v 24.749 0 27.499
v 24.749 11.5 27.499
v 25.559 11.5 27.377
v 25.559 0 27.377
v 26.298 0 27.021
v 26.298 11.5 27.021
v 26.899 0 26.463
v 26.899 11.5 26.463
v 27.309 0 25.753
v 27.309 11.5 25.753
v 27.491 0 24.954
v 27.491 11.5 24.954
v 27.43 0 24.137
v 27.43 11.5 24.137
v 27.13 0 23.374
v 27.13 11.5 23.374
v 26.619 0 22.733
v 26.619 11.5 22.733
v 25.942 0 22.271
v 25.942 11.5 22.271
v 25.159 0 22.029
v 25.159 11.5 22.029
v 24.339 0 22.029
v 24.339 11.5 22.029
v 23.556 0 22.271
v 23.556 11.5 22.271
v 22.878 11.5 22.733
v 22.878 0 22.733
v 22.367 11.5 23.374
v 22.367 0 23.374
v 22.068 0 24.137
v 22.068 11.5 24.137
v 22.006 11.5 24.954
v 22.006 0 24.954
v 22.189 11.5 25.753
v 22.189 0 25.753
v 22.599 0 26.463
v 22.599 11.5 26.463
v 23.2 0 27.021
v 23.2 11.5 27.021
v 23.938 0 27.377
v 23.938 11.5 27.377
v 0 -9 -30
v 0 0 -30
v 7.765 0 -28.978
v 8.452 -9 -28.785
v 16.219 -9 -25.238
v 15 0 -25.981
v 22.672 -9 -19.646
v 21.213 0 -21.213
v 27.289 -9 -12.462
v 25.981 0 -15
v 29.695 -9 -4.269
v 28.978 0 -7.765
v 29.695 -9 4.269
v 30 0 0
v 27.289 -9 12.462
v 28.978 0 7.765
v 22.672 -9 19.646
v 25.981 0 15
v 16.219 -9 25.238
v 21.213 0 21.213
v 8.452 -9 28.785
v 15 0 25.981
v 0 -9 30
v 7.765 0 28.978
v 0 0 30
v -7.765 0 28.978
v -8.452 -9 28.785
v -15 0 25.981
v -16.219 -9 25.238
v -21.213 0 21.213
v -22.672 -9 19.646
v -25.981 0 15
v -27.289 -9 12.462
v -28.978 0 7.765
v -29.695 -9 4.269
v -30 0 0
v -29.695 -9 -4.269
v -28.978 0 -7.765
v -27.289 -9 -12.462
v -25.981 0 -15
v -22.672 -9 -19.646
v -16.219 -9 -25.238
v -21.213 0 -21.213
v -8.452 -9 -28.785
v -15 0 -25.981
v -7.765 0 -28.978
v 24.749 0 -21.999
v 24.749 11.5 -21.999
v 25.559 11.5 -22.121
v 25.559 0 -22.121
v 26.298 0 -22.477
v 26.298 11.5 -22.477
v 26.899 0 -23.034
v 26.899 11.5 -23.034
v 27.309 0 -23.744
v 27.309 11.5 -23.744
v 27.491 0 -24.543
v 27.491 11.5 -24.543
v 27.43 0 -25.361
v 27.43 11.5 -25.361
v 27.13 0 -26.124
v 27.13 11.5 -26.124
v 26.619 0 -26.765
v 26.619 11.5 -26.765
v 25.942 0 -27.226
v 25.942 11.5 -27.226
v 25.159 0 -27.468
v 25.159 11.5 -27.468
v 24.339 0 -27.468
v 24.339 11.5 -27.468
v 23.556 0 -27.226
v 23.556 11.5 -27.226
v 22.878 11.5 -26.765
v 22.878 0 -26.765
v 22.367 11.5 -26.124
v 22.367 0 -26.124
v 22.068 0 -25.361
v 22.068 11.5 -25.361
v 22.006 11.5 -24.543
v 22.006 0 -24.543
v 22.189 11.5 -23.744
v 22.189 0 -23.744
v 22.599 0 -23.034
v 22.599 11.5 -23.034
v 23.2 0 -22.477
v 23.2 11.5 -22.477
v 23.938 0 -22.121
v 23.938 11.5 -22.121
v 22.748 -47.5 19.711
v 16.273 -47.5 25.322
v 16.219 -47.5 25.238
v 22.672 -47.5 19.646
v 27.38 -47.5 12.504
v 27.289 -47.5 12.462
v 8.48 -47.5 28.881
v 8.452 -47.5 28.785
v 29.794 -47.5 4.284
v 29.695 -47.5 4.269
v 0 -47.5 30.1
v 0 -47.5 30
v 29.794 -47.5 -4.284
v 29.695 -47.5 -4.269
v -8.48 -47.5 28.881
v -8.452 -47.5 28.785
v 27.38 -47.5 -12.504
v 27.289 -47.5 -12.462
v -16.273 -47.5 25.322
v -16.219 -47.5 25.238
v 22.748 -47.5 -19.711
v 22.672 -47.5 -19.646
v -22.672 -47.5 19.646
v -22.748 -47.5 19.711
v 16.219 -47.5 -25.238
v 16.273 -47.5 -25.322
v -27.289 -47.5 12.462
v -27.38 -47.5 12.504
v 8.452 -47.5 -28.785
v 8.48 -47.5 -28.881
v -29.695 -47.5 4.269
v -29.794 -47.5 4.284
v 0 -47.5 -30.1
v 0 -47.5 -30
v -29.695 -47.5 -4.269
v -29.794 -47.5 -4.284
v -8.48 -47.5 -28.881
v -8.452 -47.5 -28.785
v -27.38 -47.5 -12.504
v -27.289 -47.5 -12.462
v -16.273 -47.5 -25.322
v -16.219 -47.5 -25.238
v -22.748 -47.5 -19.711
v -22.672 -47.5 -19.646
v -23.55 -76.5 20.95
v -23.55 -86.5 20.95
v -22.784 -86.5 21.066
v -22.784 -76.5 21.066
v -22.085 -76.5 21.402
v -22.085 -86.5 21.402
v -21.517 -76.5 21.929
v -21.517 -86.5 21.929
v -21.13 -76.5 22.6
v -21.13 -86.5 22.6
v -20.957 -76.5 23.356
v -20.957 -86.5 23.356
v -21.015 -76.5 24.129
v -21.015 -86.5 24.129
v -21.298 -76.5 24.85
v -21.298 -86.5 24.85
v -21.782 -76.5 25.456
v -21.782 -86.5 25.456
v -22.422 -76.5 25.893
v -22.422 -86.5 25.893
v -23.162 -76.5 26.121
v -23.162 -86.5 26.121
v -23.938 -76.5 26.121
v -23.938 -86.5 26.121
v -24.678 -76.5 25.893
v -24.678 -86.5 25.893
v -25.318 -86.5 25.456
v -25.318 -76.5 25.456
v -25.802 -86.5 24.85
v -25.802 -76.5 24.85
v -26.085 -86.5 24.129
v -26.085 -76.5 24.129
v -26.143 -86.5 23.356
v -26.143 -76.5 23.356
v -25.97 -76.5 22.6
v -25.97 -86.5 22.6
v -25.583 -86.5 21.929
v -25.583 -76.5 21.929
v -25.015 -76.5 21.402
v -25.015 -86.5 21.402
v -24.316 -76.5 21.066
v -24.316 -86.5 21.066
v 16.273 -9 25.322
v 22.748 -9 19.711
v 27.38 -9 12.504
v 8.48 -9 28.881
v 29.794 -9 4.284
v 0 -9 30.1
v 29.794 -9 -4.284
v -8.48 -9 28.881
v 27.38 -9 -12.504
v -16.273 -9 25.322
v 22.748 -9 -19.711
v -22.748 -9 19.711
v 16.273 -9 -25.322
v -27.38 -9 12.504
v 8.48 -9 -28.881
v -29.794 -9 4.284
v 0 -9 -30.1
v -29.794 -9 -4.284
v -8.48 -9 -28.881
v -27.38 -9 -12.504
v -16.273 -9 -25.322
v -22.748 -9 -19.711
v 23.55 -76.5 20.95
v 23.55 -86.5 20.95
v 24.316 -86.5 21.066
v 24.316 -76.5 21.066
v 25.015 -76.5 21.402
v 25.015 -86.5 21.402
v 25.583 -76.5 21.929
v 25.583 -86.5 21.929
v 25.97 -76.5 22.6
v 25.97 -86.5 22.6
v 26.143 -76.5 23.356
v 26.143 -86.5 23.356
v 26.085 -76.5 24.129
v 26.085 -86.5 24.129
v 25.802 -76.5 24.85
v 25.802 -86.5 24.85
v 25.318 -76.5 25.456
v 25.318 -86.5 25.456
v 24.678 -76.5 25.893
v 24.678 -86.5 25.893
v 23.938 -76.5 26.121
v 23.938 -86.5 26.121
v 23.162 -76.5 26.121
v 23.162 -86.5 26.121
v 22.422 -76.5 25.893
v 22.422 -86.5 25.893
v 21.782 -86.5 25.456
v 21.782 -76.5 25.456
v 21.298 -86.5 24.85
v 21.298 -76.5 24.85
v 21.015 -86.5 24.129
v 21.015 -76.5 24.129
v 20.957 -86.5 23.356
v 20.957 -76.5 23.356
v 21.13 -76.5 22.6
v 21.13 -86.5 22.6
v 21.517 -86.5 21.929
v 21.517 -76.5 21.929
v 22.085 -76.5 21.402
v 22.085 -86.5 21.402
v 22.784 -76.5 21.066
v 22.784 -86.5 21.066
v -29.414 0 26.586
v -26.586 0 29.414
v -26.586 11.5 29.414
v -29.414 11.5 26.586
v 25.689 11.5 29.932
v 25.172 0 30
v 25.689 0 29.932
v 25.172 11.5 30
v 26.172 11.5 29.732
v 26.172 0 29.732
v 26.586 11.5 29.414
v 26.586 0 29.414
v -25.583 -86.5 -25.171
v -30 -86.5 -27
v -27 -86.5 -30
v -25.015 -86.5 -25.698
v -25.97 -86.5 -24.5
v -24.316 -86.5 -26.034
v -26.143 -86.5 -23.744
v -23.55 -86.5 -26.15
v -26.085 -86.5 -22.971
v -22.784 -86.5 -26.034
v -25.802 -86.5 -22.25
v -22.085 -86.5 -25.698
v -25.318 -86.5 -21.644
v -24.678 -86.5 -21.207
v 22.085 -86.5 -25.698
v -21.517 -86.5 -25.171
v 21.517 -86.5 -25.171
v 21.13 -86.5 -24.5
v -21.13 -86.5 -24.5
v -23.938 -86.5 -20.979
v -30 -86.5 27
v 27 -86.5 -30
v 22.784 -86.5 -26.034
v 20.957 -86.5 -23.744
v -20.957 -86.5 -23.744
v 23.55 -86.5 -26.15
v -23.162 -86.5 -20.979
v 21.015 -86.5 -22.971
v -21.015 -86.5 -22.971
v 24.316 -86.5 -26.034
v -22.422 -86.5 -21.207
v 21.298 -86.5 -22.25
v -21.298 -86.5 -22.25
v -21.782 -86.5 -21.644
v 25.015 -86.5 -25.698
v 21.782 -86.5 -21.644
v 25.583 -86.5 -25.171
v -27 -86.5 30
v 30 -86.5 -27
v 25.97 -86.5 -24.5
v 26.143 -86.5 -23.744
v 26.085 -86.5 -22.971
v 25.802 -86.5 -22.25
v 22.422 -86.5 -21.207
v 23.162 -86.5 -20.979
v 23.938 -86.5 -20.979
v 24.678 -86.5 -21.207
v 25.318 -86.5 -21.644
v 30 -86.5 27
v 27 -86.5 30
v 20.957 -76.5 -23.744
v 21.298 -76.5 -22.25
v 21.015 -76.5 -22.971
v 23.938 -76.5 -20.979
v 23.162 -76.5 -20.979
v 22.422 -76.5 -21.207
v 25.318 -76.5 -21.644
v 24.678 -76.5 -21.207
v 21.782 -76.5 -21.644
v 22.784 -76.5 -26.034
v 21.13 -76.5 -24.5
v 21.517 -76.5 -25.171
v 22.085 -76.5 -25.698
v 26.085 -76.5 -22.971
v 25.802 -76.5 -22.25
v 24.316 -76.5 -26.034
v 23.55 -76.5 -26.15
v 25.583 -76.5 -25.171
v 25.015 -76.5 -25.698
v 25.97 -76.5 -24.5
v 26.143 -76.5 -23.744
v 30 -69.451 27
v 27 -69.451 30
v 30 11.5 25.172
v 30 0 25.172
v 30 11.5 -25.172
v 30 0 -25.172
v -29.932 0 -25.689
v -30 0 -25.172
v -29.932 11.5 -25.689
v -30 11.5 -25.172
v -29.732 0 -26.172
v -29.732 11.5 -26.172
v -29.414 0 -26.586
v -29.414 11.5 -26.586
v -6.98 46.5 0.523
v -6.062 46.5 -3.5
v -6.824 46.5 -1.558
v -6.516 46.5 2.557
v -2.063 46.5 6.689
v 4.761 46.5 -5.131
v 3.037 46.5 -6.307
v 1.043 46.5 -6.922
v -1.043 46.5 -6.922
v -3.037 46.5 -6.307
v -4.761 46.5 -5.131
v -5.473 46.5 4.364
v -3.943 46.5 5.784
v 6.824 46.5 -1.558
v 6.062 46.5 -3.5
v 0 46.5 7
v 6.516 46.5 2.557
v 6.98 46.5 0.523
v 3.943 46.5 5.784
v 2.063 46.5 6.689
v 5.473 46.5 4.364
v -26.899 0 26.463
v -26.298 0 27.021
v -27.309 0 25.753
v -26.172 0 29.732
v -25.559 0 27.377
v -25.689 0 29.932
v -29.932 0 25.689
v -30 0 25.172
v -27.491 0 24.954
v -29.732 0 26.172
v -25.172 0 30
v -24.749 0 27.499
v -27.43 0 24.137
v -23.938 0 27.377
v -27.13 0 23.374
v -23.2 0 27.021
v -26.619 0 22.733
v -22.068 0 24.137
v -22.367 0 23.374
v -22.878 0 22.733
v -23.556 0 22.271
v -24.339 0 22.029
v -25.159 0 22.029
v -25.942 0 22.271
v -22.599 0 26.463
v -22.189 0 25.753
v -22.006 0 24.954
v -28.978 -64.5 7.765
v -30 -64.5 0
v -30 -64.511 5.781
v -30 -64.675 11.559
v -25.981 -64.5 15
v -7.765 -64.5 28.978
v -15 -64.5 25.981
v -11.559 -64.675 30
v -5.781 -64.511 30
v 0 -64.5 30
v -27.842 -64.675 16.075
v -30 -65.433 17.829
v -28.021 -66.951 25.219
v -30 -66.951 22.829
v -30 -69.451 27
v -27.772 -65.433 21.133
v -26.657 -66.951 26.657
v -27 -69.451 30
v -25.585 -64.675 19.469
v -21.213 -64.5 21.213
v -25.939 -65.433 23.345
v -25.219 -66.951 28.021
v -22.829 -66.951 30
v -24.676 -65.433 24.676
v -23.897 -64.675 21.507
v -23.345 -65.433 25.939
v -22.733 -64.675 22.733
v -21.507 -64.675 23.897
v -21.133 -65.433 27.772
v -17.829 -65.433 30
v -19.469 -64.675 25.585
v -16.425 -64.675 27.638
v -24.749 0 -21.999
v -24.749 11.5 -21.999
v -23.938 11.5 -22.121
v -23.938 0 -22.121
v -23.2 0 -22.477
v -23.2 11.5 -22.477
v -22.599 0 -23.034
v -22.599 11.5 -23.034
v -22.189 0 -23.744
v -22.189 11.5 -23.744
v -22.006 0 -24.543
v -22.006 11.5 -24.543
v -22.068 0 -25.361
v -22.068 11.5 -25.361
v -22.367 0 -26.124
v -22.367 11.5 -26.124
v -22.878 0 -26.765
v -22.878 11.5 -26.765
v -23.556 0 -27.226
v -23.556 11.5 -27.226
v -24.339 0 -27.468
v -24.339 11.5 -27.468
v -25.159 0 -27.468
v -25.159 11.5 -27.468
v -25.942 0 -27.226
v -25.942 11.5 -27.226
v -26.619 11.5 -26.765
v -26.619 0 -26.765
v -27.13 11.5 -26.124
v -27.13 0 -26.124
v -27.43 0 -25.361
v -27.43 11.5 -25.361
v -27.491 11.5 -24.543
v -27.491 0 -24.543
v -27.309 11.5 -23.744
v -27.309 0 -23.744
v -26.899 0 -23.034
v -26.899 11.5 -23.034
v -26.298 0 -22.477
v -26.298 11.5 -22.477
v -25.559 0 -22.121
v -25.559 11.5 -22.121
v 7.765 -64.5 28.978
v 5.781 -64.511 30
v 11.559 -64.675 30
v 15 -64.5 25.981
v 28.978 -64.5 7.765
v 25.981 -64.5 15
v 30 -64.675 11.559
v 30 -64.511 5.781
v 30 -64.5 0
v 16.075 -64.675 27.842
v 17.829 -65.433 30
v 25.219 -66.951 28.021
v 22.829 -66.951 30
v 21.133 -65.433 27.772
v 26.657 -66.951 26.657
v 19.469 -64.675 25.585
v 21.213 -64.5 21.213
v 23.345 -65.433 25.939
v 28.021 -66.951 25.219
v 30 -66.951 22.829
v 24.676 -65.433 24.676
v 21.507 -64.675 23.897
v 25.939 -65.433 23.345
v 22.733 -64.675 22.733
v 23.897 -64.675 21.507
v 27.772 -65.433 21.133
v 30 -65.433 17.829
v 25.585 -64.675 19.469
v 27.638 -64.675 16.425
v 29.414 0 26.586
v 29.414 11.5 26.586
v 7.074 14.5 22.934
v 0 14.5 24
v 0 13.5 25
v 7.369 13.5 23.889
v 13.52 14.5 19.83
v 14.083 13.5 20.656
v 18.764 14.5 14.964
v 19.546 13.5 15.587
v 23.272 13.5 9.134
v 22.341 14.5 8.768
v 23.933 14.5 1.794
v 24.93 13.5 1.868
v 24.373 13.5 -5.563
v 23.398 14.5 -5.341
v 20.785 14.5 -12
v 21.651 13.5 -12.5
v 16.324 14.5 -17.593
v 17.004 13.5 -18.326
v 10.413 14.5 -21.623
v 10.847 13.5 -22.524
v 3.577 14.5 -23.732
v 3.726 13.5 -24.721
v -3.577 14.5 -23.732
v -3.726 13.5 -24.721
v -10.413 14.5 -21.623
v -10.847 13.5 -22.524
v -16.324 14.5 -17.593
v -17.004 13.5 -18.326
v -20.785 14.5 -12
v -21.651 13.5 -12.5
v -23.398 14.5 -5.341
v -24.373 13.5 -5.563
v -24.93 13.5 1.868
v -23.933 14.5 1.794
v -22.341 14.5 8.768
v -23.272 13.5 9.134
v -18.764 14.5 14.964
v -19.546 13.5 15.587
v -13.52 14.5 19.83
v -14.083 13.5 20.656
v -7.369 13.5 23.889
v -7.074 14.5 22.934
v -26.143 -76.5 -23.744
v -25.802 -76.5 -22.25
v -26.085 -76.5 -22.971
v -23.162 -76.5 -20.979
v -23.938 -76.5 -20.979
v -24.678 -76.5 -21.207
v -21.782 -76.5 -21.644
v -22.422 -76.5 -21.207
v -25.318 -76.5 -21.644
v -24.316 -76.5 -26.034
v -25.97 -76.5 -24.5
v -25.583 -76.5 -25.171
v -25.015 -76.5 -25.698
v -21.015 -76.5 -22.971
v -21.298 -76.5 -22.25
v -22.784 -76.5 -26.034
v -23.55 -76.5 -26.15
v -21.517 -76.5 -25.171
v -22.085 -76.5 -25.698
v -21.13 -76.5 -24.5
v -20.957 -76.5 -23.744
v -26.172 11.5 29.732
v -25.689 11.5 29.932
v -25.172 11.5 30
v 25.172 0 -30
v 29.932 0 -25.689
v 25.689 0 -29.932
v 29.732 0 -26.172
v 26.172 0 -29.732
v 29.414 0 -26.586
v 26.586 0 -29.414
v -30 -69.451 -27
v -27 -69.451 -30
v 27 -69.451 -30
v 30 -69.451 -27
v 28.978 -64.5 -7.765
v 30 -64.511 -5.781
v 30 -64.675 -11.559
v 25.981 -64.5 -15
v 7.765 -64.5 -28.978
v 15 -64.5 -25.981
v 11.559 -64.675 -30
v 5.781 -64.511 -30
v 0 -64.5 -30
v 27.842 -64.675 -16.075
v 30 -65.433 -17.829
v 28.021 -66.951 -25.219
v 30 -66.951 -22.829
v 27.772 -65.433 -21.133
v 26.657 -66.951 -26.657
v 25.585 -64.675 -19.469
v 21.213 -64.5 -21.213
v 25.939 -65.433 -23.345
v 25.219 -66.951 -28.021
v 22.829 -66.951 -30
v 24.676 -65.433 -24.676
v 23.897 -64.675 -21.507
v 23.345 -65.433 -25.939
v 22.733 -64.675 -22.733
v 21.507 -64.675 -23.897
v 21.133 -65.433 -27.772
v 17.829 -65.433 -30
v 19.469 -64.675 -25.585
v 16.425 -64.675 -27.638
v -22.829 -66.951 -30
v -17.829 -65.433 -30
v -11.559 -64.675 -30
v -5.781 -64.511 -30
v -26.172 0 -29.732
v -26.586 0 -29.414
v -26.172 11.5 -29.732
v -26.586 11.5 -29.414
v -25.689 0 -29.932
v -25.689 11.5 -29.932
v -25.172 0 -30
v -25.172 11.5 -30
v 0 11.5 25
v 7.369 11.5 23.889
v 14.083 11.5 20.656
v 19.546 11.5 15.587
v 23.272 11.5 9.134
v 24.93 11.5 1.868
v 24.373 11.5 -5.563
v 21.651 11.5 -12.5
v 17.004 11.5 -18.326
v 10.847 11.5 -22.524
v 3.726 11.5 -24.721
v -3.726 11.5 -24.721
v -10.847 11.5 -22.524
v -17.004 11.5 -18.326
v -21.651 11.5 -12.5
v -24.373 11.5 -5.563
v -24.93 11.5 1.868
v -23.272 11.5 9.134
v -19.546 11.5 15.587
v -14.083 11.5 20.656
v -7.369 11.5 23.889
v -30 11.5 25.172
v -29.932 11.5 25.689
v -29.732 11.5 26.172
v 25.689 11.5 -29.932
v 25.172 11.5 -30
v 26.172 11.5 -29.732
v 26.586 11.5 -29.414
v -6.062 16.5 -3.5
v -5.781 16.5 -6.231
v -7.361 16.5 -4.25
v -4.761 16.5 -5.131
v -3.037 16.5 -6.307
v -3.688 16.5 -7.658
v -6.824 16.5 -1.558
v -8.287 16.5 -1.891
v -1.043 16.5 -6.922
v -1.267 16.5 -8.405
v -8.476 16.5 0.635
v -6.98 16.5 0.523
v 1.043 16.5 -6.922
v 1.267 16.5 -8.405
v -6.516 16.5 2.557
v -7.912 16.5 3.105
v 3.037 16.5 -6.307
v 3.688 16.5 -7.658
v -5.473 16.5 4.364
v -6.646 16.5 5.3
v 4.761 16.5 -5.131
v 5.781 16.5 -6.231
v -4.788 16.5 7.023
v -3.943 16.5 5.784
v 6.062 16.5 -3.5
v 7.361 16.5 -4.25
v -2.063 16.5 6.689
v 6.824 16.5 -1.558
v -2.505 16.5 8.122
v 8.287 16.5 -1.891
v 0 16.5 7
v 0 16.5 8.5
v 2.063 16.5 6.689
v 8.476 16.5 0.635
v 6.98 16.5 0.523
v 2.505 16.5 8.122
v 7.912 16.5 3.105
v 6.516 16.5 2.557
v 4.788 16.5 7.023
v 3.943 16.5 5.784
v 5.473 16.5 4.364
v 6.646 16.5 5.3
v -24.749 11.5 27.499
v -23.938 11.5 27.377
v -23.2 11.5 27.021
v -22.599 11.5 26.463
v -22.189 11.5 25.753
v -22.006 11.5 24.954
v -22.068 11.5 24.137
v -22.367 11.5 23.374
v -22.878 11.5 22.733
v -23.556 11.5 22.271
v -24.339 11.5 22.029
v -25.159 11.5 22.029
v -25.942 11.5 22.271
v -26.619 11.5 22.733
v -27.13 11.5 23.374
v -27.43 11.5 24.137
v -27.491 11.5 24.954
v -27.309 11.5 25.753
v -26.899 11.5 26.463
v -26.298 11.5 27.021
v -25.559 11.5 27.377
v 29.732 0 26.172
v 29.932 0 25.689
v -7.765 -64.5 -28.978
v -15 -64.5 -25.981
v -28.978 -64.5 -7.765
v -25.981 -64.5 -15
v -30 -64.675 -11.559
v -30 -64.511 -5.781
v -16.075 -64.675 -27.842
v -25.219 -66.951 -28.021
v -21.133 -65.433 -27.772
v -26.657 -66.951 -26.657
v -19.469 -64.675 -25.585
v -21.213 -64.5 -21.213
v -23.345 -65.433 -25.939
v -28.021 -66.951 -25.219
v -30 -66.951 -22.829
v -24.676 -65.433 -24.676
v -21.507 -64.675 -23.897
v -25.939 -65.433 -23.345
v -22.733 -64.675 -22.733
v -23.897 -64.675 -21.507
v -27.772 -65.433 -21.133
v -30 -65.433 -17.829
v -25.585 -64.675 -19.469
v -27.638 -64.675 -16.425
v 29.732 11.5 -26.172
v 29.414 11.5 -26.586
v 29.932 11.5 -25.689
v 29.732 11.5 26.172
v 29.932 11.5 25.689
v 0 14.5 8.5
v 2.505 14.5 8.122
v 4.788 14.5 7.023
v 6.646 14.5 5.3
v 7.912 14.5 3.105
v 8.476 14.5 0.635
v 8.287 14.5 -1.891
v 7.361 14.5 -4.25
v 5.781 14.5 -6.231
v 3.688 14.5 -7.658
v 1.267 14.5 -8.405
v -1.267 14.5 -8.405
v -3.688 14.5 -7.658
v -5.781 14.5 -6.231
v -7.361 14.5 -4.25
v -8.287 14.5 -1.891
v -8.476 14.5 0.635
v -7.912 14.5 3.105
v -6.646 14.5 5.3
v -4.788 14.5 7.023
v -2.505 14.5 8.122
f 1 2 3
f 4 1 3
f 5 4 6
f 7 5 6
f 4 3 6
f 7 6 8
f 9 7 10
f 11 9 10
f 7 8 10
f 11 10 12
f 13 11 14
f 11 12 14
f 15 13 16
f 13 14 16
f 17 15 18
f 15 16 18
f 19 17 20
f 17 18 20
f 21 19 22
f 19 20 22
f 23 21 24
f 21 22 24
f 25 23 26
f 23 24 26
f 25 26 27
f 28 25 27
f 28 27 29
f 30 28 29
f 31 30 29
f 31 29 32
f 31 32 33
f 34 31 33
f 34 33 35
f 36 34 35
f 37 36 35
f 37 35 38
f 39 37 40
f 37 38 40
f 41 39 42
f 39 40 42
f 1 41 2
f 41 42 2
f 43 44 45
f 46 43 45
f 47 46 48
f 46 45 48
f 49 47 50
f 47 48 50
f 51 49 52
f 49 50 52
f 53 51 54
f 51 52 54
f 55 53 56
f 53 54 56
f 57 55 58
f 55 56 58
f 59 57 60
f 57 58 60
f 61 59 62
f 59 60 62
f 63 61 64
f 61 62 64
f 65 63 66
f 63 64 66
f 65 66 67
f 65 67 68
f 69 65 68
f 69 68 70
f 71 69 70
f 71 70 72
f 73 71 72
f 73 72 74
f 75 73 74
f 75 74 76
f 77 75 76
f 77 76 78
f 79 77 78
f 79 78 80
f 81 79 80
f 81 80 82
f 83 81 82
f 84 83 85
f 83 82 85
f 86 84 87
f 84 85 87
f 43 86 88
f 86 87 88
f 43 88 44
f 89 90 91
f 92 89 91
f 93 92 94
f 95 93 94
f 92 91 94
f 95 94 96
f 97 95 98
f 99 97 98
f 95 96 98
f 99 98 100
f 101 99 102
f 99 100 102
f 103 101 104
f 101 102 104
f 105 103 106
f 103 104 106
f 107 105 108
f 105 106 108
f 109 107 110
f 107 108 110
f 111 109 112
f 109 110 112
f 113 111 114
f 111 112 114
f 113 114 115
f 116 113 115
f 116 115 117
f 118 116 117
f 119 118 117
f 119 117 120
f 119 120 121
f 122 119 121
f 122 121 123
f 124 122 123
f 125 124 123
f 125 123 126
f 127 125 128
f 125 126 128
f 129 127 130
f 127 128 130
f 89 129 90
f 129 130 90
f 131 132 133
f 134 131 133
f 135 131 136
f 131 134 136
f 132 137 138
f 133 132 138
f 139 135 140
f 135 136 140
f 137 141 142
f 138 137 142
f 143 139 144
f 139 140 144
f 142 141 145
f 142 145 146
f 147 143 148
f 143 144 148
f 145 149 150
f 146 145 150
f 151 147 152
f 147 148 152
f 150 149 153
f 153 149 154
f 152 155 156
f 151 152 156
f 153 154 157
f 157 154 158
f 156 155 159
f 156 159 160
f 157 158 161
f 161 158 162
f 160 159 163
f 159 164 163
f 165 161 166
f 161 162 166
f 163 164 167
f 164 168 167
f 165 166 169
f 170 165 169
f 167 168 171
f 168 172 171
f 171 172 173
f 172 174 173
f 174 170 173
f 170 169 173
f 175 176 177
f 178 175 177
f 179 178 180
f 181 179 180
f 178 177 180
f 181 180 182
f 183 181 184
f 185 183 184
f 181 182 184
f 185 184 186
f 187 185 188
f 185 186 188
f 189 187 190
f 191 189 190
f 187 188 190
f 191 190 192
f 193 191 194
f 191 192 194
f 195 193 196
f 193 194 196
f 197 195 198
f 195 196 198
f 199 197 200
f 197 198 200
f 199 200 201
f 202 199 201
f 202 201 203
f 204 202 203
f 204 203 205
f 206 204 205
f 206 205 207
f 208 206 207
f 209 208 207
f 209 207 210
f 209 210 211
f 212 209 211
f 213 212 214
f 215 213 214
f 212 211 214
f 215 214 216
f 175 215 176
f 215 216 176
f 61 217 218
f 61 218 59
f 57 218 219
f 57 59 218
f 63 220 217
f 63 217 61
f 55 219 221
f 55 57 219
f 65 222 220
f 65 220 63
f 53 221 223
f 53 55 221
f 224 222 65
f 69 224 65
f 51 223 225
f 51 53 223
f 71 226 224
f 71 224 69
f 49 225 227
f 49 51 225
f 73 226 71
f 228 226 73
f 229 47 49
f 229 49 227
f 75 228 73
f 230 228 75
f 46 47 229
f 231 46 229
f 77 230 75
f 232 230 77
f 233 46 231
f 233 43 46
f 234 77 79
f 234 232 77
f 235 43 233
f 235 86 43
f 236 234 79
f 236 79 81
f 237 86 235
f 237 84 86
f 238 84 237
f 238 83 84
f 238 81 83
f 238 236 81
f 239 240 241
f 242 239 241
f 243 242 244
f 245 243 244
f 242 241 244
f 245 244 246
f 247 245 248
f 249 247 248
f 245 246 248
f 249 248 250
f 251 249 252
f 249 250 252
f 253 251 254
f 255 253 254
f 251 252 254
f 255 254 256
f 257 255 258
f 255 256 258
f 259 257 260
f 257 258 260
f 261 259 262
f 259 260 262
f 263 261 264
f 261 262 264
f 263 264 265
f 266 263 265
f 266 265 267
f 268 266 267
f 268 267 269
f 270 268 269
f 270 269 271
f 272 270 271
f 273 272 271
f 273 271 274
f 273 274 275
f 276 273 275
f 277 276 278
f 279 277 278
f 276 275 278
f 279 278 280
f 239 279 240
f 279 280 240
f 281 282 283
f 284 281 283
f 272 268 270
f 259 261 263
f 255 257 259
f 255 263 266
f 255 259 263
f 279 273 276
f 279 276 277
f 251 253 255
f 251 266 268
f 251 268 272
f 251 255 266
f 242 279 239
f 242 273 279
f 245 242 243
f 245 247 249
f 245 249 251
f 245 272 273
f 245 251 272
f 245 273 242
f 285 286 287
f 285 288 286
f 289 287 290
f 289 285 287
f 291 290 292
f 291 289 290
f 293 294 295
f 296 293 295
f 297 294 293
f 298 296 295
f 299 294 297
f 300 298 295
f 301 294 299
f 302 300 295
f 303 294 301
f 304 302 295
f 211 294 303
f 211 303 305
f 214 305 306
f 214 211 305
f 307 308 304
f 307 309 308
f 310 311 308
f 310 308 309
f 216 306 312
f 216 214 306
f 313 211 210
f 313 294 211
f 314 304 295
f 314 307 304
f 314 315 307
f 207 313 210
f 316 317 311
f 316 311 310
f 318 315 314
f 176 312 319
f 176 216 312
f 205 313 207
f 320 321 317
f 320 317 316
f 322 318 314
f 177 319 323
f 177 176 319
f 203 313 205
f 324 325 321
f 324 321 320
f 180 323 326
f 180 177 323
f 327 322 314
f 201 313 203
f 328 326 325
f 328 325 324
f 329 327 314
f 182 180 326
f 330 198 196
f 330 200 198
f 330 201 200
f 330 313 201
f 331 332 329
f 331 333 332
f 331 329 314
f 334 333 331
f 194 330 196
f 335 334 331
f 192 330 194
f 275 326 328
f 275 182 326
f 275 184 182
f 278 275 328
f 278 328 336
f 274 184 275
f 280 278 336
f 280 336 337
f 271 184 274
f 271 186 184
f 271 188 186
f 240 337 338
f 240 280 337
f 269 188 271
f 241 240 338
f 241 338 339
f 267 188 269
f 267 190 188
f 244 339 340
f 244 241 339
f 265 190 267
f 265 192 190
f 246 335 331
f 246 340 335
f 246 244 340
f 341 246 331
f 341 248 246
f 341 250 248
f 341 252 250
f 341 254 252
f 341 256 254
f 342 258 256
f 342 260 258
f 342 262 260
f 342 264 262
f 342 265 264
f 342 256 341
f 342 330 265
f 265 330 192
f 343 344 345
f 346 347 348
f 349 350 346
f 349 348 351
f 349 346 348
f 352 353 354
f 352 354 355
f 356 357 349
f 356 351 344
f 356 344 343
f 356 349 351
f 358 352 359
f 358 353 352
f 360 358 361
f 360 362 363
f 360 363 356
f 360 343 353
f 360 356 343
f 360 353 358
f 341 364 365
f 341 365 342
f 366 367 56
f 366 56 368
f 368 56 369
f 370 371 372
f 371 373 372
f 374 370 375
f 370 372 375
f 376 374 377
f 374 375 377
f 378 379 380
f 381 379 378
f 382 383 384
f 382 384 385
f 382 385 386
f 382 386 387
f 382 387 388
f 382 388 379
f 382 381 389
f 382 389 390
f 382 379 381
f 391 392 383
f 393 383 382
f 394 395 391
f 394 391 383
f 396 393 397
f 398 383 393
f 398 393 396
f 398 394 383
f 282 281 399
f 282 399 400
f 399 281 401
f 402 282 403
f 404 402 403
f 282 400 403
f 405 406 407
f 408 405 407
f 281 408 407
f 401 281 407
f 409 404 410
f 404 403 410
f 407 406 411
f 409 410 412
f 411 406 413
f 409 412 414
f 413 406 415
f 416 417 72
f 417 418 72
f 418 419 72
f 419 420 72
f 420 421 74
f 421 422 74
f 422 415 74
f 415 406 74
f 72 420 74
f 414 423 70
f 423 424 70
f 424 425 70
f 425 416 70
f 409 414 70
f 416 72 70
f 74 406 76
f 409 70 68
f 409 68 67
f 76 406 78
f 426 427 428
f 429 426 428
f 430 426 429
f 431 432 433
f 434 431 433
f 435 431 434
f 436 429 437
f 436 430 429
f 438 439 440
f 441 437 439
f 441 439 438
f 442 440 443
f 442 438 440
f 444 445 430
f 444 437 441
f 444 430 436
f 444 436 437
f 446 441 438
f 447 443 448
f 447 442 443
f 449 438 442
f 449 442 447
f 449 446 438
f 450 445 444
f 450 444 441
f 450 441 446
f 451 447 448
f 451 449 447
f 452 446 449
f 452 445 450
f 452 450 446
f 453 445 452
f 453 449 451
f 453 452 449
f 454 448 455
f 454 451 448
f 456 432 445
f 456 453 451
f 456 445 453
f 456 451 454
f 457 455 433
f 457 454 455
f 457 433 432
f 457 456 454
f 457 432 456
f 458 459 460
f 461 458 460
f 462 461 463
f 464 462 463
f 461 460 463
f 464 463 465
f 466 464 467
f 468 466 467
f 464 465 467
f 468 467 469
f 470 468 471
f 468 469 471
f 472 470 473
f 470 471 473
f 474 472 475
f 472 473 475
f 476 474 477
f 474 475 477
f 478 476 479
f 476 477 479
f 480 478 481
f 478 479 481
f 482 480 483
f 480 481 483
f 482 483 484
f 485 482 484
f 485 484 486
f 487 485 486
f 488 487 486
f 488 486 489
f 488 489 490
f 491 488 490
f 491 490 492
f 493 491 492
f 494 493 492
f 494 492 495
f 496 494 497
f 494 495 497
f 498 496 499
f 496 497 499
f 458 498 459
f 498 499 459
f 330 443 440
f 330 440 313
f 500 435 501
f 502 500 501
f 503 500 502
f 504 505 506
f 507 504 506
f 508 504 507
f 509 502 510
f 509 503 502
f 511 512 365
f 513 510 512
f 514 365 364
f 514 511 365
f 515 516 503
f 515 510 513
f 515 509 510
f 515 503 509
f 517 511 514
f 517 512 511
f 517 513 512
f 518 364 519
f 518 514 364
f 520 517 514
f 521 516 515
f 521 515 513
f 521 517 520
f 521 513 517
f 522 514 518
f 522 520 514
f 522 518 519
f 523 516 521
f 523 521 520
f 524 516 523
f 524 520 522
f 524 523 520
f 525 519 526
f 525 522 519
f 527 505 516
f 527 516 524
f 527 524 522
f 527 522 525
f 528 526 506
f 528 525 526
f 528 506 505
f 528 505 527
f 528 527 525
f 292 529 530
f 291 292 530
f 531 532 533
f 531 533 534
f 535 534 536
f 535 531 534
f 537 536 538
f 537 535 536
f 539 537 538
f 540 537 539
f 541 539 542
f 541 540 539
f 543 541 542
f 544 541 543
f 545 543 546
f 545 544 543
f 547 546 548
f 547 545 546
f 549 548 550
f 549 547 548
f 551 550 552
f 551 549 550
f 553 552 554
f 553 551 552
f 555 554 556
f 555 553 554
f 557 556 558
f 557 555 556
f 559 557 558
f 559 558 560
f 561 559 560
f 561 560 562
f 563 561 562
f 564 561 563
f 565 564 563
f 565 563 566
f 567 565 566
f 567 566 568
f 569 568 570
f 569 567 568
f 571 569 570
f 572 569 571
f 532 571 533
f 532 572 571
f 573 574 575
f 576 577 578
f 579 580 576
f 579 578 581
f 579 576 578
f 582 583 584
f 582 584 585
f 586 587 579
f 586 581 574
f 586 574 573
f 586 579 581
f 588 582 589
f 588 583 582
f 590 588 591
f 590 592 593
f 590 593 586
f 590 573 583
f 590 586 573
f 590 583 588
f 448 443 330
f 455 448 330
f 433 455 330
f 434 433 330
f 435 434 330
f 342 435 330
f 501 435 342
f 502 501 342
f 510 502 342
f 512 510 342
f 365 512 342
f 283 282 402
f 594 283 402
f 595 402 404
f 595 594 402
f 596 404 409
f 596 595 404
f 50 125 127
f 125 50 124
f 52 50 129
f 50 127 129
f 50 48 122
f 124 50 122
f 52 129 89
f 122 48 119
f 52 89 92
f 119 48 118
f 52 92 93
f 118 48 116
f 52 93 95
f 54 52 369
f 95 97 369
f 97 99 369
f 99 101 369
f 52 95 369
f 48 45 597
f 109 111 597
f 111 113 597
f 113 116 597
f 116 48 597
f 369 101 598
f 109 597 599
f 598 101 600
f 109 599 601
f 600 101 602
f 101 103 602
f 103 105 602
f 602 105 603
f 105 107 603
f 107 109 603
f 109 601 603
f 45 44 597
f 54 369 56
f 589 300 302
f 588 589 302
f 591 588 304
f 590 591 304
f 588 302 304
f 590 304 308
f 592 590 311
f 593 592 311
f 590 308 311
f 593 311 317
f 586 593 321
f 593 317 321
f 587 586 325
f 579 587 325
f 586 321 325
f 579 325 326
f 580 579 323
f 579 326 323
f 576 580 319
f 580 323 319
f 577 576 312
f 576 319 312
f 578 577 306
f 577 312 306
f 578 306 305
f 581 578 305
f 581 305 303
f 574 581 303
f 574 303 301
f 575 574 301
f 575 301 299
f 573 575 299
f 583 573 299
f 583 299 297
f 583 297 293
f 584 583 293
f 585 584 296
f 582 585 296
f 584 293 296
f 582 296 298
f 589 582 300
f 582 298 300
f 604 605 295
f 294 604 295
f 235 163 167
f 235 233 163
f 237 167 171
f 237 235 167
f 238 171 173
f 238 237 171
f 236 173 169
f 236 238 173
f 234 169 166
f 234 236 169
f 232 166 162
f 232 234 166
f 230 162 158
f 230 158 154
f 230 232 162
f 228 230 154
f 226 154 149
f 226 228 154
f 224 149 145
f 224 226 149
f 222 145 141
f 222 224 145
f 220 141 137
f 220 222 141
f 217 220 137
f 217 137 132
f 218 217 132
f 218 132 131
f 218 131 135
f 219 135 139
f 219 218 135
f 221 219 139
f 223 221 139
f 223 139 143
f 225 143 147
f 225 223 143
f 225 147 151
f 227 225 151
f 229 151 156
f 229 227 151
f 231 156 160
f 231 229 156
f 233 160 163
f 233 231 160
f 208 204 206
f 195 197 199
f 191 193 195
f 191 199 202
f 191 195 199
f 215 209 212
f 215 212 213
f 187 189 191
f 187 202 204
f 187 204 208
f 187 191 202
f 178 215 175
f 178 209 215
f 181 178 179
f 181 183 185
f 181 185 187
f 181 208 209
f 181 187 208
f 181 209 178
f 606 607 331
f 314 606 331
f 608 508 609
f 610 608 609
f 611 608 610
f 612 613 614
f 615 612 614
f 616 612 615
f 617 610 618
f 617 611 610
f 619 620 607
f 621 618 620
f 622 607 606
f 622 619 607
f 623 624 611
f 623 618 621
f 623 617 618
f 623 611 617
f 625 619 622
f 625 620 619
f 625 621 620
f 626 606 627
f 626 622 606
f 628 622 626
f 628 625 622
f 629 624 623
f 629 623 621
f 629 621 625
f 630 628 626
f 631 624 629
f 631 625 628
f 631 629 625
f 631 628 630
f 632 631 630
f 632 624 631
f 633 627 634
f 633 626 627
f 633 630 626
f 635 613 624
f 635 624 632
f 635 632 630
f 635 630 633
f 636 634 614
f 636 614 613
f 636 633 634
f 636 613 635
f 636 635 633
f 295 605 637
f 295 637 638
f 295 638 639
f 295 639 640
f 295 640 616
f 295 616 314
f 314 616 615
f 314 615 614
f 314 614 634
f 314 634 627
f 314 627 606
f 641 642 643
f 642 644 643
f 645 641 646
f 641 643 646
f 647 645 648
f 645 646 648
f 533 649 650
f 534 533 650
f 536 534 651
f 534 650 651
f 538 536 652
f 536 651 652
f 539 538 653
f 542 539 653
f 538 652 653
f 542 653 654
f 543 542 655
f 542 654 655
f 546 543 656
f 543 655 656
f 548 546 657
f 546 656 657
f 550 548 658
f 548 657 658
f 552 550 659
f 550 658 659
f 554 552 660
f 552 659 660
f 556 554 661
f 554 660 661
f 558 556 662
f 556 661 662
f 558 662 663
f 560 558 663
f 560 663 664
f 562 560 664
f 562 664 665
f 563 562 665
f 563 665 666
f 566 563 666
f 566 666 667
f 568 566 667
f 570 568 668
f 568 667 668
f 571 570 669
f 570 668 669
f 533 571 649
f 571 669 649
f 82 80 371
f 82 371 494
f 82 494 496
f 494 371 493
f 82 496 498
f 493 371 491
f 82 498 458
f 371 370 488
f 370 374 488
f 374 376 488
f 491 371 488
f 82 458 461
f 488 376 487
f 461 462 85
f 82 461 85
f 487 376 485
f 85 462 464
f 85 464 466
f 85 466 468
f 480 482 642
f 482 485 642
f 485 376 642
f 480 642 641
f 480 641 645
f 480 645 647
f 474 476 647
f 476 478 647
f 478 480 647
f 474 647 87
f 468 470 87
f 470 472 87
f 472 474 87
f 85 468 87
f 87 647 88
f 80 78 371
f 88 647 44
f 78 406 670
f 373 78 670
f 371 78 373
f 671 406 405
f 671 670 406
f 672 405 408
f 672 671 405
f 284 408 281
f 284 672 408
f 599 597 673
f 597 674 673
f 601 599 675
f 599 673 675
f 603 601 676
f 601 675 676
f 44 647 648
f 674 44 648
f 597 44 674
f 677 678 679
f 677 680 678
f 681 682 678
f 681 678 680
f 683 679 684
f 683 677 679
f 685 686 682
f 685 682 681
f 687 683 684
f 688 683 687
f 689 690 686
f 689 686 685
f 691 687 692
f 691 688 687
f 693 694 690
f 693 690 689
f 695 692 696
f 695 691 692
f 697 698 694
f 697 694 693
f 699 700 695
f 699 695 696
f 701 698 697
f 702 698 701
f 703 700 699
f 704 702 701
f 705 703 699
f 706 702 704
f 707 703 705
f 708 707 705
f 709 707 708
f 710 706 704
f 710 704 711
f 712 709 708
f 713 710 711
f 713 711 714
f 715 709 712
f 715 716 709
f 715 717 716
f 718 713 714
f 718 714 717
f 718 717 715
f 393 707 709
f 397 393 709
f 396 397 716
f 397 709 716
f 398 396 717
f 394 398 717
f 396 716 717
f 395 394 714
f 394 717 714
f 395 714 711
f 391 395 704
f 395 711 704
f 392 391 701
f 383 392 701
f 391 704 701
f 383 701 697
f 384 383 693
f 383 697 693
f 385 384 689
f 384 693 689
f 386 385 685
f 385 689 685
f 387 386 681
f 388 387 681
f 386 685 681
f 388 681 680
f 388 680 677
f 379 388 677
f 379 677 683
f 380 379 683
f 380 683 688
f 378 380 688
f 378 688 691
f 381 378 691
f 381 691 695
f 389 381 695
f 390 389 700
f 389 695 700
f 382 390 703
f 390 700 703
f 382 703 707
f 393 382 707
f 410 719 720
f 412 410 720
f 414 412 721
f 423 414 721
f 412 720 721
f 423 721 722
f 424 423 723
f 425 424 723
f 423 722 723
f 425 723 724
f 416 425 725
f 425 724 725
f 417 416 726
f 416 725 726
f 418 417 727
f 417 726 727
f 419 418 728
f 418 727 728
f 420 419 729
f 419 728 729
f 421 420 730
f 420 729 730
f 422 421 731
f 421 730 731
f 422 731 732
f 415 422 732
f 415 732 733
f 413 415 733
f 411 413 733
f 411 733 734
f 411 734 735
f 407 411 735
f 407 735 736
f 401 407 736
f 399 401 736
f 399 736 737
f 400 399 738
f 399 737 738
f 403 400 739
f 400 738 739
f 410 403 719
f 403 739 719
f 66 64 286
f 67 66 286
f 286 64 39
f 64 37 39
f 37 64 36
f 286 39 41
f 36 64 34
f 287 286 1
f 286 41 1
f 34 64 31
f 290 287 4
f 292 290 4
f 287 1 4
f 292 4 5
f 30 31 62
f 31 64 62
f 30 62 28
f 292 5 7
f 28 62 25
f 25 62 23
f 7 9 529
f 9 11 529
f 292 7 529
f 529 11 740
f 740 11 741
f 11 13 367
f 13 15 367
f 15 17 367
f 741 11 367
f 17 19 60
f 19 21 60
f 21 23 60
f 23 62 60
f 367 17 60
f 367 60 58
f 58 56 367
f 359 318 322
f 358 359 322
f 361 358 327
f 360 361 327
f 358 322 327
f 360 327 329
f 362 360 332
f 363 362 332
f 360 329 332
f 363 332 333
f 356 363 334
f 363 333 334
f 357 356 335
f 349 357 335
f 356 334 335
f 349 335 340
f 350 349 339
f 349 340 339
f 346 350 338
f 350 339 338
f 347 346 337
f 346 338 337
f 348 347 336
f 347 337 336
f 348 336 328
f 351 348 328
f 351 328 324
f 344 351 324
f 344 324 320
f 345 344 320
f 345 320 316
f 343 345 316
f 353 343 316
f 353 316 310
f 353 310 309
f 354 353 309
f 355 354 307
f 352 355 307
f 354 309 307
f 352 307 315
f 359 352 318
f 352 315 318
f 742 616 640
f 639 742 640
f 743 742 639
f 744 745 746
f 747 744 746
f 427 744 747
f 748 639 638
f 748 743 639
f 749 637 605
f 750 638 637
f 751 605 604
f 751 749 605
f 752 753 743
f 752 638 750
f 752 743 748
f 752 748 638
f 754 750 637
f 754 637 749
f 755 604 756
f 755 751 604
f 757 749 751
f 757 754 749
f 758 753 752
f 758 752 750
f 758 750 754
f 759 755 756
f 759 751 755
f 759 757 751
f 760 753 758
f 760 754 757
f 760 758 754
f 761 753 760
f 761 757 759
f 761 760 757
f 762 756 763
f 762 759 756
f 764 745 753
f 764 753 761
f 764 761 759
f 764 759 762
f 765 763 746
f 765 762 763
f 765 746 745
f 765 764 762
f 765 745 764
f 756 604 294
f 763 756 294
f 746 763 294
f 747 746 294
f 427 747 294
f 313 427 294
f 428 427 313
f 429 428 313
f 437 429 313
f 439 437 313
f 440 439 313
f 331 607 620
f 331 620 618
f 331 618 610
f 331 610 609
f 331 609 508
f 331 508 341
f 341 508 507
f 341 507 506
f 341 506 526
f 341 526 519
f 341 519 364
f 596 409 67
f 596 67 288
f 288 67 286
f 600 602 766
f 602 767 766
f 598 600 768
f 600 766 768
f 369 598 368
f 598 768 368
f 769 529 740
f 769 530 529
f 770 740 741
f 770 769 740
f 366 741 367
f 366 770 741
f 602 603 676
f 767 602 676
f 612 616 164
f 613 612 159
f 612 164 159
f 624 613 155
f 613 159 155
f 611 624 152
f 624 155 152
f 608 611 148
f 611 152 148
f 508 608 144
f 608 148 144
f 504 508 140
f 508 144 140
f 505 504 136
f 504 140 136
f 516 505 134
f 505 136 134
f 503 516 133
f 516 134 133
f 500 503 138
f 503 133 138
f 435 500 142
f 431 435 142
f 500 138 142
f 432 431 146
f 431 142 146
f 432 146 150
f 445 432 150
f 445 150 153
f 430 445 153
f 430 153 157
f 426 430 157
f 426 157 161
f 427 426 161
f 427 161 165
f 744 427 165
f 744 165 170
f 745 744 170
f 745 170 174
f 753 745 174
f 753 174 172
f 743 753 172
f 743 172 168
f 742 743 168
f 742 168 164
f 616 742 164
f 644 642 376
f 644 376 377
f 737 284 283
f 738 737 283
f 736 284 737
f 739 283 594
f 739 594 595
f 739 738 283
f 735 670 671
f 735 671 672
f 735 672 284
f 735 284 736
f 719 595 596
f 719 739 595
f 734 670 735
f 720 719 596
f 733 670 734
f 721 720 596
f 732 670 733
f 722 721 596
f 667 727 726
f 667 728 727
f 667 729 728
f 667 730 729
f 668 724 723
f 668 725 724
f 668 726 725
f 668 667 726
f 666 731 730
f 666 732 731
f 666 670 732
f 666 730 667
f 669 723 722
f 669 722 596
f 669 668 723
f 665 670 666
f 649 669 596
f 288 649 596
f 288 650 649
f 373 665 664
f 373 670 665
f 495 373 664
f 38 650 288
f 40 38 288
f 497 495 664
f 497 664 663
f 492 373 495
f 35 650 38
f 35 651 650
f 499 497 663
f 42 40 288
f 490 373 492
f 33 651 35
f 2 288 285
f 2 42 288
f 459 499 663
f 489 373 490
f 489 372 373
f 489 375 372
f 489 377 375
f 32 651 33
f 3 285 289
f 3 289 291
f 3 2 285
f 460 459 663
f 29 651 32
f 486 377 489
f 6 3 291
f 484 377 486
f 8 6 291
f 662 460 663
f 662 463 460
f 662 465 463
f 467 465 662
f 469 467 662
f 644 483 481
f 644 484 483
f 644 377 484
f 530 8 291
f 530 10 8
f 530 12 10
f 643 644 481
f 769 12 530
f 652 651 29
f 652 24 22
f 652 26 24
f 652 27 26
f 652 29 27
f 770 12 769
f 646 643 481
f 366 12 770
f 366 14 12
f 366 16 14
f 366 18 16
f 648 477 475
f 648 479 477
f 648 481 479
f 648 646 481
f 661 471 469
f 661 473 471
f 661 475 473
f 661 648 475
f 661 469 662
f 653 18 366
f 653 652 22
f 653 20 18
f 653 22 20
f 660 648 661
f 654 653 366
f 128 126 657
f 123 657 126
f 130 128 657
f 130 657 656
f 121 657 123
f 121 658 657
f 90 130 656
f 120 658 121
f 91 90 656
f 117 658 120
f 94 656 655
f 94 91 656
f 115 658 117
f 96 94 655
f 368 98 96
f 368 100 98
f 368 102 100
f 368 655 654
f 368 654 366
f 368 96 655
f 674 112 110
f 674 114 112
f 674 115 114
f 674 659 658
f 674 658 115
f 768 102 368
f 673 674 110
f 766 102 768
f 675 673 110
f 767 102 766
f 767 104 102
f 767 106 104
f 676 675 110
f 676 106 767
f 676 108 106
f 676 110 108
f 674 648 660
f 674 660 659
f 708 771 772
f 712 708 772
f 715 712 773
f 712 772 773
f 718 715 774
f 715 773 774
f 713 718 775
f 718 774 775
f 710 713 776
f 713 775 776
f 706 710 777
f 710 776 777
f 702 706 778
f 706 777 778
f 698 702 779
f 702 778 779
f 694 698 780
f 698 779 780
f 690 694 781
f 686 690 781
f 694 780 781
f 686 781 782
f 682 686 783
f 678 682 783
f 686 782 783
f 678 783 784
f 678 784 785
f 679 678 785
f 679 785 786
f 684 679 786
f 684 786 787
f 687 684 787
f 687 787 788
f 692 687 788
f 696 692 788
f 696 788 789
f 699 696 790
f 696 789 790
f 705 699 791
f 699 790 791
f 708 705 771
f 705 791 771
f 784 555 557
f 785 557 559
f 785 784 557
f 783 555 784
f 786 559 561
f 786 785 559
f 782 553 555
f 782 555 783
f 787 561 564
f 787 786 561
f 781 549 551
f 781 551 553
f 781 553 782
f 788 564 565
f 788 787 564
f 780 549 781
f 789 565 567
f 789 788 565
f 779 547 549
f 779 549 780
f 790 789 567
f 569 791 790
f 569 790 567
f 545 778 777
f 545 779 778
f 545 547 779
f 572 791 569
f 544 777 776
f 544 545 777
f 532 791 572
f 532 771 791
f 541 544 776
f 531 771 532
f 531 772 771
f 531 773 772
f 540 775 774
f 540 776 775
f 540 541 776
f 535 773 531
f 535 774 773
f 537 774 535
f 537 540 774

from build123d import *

# Parameters (mm, degrees)
IZIM1_W                      = 60
IZIM1_H                      = 60
Y_KSEKLIK_EKSTR_ZYON1_DEPTH  = 11.5
PAH1_SIZE                    = 4
IZIM2_R                      = 25
Y_KSEKLIK_EKSTR_ZYON2_DEPTH  = 3
PAH2_SIZE                    = 1
RADYUS1_R                    = 2
IZIM3_R                      = 30
Y_KSEKLIK_EKSTR_ZYON3_DEPTH  = 64.5
IZIM4_W                      = 60
IZIM4_H                      = 60
Y_KSEKLIK_EKSTR_ZYON4_DEPTH  = 22
PAH3_SIZE                    = 3
IZIM19_R                     = 8.5
Y_KSEKLIK_EKSTR_ZYON12_DEPTH = 2
IZIM20_R                     = 7
Y_KSEKLIK_EKSTR_ZYON13_DEPTH = 30
IZIM22_R                     = 2.75
KES_EKSTR_ZYON2_DEPTH        = 11.5
IZIM23_W                     = 0.1
IZIM23_H                     = 38.5
IZIM25_R                     = 2.6
KES_EKSTR_ZYON4_DEPTH        = 10


with BuildPart() as part:
    # Çizim1 → Yükseklik-Ekstrüzyon1 (new body)
    with BuildSketch(Plane(origin=(0, 0, 0), x_dir=(1, 0, 0), z_dir=(0, 1, 0))):
        Rectangle(IZIM1_W, IZIM1_H)
    extrude(amount=Y_KSEKLIK_EKSTR_ZYON1_DEPTH)

    # Pah1
    pah1_edges = [part.edges().sort_by_distance(p)[0] for p in [
        (30, 5.75, 30),
        (-30, 5.75, 30),
        (-30, 5.75, -30),
        (30, 5.75, -30),
    ]]
    chamfer(pah1_edges, length=PAH1_SIZE)

    # Çizim2 → Yükseklik-Ekstrüzyon2 (add)
    with BuildSketch(Plane(origin=(0, 11.5, 0), x_dir=(1, 0, 0), z_dir=(0, 1, 0))):
        with Locations(Location((0, 0, 0), (0, 0, 270))):
            Circle(IZIM2_R)
    extrude(amount=Y_KSEKLIK_EKSTR_ZYON2_DEPTH)

    # Pah2
    pah2_edges = [part.edges().sort_by_distance(p)[0] for p in [
        (0, 14.5, -25),
    ]]
    chamfer(pah2_edges, length=PAH2_SIZE)

    # Radyus1
    radyus1_edges = [part.edges().sort_by_distance(p)[0] for p in [
        (-30, 5.75, 26),
        (-30, 5.75, -26),
        (26, 5.75, -30),
        (-26, 5.75, -30),
        (26, 5.75, 30),
        (-26, 5.75, 30),
        (30, 5.75, 26),
        (30, 5.75, -26),
    ]]
    fillet(radyus1_edges, radius=RADYUS1_R)

    # Çizim3 → Yükseklik-Ekstrüzyon3 (add)
    with BuildSketch(Plane.XZ):
        with Locations(Location((0, 0, 0), (0, 0, 270))):
            Circle(IZIM3_R)
    extrude(amount=Y_KSEKLIK_EKSTR_ZYON3_DEPTH)

    # Çizim4 → Yükseklik-Ekstrüzyon4 (add)
    with BuildSketch(Plane.XZ.offset(64.5)):
        Rectangle(IZIM4_W, IZIM4_H)
    extrude(amount=Y_KSEKLIK_EKSTR_ZYON4_DEPTH)

    # Pah3
    pah3_edges = [part.edges().sort_by_distance(p)[0] for p in [
        (30, -75.5, -30),
        (30, -75.5, 30),
        (-30, -75.5, 30),
        (-30, -75.5, -30),
    ]]
    chamfer(pah3_edges, length=PAH3_SIZE)

    # Çizim8 → Kes-Döndür2 (revolve, cut)
    with BuildSketch(Plane(origin=(0, 0, 0), x_dir=(0, 0, -1), z_dir=(1, 0, 0))):
        with BuildLine():
            Line((-30, -64.5), (-40.4, -64.5))
            Line((-40.4, -64.5), (-40.4, -69.5))
            ThreePointArc((-40.4, -69.5), (-35.769748695, -65.814922715), (-30, -64.5))
        make_face()
    revolve(axis=Axis((0, -86.5, 0), (0, 1, 0)), mode=Mode.SUBTRACT)

    # Çizim19 → Yükseklik-Ekstrüzyon12 (add)
    with BuildSketch(Plane(origin=(0, 14.5, 0), x_dir=(1, 0, 0), z_dir=(0, 1, 0))):
        with Locations(Location((0, 0, 0), (0, 0, 270))):
            Circle(IZIM19_R)
    extrude(amount=Y_KSEKLIK_EKSTR_ZYON12_DEPTH)

    # Çizim20 → Yükseklik-Ekstrüzyon13 (add)
    with BuildSketch(Plane(origin=(0, 16.5, 0), x_dir=(1, 0, 0), z_dir=(0, 1, 0))):
        with Locations(Location((0, 0, 0), (0, 0, 270))):
            Circle(IZIM20_R)
    extrude(amount=Y_KSEKLIK_EKSTR_ZYON13_DEPTH)

    # Çizim22 → Kes-Ekstrüzyon2 (cut)
    with BuildSketch(Plane(origin=(0, 11.5, 0), x_dir=(1, 0, 0), z_dir=(0, 1, 0))):
        with Locations(Location((-24.748737342, 24.748737342, 0), (0, 0, 270))):
            Circle(IZIM22_R)
        with Locations(Location((24.748737342, 24.748737342, 0), (0, 0, 270))):
            Circle(IZIM22_R)
        with Locations(Location((24.748737342, -24.748737342, 0), (0, 0, 270))):
            Circle(IZIM22_R)
        with Locations(Location((-24.748737342, -24.748737342, 0), (0, 0, 270))):
            Circle(IZIM22_R)
    extrude(amount=-KES_EKSTR_ZYON2_DEPTH, mode=Mode.SUBTRACT)

    # Çizim23 → Döndür1 (revolve)
    with BuildSketch(Plane.XY, mode=Mode.PRIVATE) as d_nd_r1_sk:
        with Locations((-30.05, -28.25)):
            Rectangle(IZIM23_W, IZIM23_H)
    revolve(d_nd_r1_sk.sketch.rotate(Axis((0, -64.5, 0), (0, 1, 0)), 270), axis=Axis((0, -64.5, 0), (0, 1, 0)))

    # Çizim25 → Kes-Ekstrüzyon4 (cut)
    with BuildSketch(Plane(origin=(0, -86.5, 0), x_dir=(-1, 0, 0), z_dir=(0, -1, 0))):
        with Locations(Location((23.55, -23.55, 0), (0, 0, 90))):
            Circle(IZIM25_R)
        with Locations(Location((-23.55, -23.55, 0), (0, 0, 90))):
            Circle(IZIM25_R)
        with Locations(Location((23.55, 23.55, 0), (0, 0, 90))):
            Circle(IZIM25_R)
        with Locations(Location((-23.55, 23.55, 0), (0, 0, 90))):
            Circle(IZIM25_R)
    extrude(amount=-KES_EKSTR_ZYON4_DEPTH, mode=Mode.SUBTRACT)


solid = part.part
